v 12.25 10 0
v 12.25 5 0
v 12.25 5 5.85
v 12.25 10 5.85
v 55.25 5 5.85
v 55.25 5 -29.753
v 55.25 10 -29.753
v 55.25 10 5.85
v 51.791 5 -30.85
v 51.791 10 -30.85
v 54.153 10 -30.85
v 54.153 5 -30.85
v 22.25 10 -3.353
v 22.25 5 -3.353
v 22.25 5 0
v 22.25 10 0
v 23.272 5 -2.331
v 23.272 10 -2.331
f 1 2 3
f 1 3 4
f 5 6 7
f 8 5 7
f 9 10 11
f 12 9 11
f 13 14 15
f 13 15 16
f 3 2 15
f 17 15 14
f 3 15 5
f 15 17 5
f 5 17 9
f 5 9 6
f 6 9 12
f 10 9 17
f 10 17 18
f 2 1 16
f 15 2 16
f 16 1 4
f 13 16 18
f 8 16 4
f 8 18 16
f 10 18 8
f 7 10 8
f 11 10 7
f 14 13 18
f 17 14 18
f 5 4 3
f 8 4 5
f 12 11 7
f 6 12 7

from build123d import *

# Parameters (mm, degrees)
BOX010_W               = 5
BOX010_H               = 85
BOX010_DEPTH           = 42
BOX010_PLACEMENT_ANGLE = 315
BOX007_W               = 7
BOX007_H               = 5
BOX007_DEPTH           = 36.85
BOX_W                  = 50
BOX_H                  = 5
BOX_DEPTH              = 5.85
BOX004_W               = 24
BOX004_H               = 85
BOX004_DEPTH           = 42
BOX004_PLACEMENT_ANGLE = 315
BOX002_W               = 40
BOX002_H               = 5
BOX002_DEPTH           = 30.85


with BuildPart() as cube010:
    # Box010 → Box010 (new body)
    with BuildSketch(Plane.XY):
        with Locations((2.5, 42.5)):
            Rectangle(BOX010_W, BOX010_H)
    extrude(amount=BOX010_DEPTH)


with BuildPart() as cube010_1:
    # Box010 placement: moved
    add(cube010.part.moved(Location((82.4, 5, -62))).rotate(Axis((82.4, 5, -62), (0, 1, 0)), BOX010_PLACEMENT_ANGLE))


with BuildPart() as cube007:
    # Box007 → Box007 (new body)
    with BuildSketch(Plane(origin=(55.25, 5, -31), x_dir=(1, 0, 0), z_dir=(0, 0, 1))):
        with Locations((3.5, 2.5)):
            Rectangle(BOX007_W, BOX007_H)
    extrude(amount=BOX007_DEPTH)


with BuildPart() as cube:
    # Box → Box (new body)
    with BuildSketch(Plane(origin=(12.25, 5, 0), x_dir=(1, 0, 0), z_dir=(0, 0, 1))):
        with Locations((25, 2.5)):
            Rectangle(BOX_W, BOX_H)
    extrude(amount=BOX_DEPTH)


with BuildPart() as cube004:
    # Box004 → Box004 (new body)
    with BuildSketch(Plane.XY):
        with Locations((12, 42.5)):
            Rectangle(BOX004_W, BOX004_H)
    extrude(amount=BOX004_DEPTH)


with BuildPart() as cube004_1:
    # Box004 placement: moved
    add(cube004.part.moved(Location((36, 5, -49))).rotate(Axis((36, 5, -49), (0, 1, 0)), BOX004_PLACEMENT_ANGLE))


with BuildPart() as cut005:
    # Box002 → Box002 (new body)
    with BuildSketch(Plane(origin=(22.25, 5, -30.85), x_dir=(1, 0, 0), z_dir=(0, 0, 1))):
        with Locations((20, 2.5)):
            Rectangle(BOX002_W, BOX002_H)
    extrude(amount=BOX002_DEPTH)

    # Cut: cut Cube004
    add(cube004_1.part, mode=Mode.SUBTRACT)

    # Fusion: union Cube
    add(cube.part)

    # Cut002: cut Cube007
    add(cube007.part, mode=Mode.SUBTRACT)

    # Cut005: cut Cube010
    add(cube010_1.part, mode=Mode.SUBTRACT)


solid = cut005.part
